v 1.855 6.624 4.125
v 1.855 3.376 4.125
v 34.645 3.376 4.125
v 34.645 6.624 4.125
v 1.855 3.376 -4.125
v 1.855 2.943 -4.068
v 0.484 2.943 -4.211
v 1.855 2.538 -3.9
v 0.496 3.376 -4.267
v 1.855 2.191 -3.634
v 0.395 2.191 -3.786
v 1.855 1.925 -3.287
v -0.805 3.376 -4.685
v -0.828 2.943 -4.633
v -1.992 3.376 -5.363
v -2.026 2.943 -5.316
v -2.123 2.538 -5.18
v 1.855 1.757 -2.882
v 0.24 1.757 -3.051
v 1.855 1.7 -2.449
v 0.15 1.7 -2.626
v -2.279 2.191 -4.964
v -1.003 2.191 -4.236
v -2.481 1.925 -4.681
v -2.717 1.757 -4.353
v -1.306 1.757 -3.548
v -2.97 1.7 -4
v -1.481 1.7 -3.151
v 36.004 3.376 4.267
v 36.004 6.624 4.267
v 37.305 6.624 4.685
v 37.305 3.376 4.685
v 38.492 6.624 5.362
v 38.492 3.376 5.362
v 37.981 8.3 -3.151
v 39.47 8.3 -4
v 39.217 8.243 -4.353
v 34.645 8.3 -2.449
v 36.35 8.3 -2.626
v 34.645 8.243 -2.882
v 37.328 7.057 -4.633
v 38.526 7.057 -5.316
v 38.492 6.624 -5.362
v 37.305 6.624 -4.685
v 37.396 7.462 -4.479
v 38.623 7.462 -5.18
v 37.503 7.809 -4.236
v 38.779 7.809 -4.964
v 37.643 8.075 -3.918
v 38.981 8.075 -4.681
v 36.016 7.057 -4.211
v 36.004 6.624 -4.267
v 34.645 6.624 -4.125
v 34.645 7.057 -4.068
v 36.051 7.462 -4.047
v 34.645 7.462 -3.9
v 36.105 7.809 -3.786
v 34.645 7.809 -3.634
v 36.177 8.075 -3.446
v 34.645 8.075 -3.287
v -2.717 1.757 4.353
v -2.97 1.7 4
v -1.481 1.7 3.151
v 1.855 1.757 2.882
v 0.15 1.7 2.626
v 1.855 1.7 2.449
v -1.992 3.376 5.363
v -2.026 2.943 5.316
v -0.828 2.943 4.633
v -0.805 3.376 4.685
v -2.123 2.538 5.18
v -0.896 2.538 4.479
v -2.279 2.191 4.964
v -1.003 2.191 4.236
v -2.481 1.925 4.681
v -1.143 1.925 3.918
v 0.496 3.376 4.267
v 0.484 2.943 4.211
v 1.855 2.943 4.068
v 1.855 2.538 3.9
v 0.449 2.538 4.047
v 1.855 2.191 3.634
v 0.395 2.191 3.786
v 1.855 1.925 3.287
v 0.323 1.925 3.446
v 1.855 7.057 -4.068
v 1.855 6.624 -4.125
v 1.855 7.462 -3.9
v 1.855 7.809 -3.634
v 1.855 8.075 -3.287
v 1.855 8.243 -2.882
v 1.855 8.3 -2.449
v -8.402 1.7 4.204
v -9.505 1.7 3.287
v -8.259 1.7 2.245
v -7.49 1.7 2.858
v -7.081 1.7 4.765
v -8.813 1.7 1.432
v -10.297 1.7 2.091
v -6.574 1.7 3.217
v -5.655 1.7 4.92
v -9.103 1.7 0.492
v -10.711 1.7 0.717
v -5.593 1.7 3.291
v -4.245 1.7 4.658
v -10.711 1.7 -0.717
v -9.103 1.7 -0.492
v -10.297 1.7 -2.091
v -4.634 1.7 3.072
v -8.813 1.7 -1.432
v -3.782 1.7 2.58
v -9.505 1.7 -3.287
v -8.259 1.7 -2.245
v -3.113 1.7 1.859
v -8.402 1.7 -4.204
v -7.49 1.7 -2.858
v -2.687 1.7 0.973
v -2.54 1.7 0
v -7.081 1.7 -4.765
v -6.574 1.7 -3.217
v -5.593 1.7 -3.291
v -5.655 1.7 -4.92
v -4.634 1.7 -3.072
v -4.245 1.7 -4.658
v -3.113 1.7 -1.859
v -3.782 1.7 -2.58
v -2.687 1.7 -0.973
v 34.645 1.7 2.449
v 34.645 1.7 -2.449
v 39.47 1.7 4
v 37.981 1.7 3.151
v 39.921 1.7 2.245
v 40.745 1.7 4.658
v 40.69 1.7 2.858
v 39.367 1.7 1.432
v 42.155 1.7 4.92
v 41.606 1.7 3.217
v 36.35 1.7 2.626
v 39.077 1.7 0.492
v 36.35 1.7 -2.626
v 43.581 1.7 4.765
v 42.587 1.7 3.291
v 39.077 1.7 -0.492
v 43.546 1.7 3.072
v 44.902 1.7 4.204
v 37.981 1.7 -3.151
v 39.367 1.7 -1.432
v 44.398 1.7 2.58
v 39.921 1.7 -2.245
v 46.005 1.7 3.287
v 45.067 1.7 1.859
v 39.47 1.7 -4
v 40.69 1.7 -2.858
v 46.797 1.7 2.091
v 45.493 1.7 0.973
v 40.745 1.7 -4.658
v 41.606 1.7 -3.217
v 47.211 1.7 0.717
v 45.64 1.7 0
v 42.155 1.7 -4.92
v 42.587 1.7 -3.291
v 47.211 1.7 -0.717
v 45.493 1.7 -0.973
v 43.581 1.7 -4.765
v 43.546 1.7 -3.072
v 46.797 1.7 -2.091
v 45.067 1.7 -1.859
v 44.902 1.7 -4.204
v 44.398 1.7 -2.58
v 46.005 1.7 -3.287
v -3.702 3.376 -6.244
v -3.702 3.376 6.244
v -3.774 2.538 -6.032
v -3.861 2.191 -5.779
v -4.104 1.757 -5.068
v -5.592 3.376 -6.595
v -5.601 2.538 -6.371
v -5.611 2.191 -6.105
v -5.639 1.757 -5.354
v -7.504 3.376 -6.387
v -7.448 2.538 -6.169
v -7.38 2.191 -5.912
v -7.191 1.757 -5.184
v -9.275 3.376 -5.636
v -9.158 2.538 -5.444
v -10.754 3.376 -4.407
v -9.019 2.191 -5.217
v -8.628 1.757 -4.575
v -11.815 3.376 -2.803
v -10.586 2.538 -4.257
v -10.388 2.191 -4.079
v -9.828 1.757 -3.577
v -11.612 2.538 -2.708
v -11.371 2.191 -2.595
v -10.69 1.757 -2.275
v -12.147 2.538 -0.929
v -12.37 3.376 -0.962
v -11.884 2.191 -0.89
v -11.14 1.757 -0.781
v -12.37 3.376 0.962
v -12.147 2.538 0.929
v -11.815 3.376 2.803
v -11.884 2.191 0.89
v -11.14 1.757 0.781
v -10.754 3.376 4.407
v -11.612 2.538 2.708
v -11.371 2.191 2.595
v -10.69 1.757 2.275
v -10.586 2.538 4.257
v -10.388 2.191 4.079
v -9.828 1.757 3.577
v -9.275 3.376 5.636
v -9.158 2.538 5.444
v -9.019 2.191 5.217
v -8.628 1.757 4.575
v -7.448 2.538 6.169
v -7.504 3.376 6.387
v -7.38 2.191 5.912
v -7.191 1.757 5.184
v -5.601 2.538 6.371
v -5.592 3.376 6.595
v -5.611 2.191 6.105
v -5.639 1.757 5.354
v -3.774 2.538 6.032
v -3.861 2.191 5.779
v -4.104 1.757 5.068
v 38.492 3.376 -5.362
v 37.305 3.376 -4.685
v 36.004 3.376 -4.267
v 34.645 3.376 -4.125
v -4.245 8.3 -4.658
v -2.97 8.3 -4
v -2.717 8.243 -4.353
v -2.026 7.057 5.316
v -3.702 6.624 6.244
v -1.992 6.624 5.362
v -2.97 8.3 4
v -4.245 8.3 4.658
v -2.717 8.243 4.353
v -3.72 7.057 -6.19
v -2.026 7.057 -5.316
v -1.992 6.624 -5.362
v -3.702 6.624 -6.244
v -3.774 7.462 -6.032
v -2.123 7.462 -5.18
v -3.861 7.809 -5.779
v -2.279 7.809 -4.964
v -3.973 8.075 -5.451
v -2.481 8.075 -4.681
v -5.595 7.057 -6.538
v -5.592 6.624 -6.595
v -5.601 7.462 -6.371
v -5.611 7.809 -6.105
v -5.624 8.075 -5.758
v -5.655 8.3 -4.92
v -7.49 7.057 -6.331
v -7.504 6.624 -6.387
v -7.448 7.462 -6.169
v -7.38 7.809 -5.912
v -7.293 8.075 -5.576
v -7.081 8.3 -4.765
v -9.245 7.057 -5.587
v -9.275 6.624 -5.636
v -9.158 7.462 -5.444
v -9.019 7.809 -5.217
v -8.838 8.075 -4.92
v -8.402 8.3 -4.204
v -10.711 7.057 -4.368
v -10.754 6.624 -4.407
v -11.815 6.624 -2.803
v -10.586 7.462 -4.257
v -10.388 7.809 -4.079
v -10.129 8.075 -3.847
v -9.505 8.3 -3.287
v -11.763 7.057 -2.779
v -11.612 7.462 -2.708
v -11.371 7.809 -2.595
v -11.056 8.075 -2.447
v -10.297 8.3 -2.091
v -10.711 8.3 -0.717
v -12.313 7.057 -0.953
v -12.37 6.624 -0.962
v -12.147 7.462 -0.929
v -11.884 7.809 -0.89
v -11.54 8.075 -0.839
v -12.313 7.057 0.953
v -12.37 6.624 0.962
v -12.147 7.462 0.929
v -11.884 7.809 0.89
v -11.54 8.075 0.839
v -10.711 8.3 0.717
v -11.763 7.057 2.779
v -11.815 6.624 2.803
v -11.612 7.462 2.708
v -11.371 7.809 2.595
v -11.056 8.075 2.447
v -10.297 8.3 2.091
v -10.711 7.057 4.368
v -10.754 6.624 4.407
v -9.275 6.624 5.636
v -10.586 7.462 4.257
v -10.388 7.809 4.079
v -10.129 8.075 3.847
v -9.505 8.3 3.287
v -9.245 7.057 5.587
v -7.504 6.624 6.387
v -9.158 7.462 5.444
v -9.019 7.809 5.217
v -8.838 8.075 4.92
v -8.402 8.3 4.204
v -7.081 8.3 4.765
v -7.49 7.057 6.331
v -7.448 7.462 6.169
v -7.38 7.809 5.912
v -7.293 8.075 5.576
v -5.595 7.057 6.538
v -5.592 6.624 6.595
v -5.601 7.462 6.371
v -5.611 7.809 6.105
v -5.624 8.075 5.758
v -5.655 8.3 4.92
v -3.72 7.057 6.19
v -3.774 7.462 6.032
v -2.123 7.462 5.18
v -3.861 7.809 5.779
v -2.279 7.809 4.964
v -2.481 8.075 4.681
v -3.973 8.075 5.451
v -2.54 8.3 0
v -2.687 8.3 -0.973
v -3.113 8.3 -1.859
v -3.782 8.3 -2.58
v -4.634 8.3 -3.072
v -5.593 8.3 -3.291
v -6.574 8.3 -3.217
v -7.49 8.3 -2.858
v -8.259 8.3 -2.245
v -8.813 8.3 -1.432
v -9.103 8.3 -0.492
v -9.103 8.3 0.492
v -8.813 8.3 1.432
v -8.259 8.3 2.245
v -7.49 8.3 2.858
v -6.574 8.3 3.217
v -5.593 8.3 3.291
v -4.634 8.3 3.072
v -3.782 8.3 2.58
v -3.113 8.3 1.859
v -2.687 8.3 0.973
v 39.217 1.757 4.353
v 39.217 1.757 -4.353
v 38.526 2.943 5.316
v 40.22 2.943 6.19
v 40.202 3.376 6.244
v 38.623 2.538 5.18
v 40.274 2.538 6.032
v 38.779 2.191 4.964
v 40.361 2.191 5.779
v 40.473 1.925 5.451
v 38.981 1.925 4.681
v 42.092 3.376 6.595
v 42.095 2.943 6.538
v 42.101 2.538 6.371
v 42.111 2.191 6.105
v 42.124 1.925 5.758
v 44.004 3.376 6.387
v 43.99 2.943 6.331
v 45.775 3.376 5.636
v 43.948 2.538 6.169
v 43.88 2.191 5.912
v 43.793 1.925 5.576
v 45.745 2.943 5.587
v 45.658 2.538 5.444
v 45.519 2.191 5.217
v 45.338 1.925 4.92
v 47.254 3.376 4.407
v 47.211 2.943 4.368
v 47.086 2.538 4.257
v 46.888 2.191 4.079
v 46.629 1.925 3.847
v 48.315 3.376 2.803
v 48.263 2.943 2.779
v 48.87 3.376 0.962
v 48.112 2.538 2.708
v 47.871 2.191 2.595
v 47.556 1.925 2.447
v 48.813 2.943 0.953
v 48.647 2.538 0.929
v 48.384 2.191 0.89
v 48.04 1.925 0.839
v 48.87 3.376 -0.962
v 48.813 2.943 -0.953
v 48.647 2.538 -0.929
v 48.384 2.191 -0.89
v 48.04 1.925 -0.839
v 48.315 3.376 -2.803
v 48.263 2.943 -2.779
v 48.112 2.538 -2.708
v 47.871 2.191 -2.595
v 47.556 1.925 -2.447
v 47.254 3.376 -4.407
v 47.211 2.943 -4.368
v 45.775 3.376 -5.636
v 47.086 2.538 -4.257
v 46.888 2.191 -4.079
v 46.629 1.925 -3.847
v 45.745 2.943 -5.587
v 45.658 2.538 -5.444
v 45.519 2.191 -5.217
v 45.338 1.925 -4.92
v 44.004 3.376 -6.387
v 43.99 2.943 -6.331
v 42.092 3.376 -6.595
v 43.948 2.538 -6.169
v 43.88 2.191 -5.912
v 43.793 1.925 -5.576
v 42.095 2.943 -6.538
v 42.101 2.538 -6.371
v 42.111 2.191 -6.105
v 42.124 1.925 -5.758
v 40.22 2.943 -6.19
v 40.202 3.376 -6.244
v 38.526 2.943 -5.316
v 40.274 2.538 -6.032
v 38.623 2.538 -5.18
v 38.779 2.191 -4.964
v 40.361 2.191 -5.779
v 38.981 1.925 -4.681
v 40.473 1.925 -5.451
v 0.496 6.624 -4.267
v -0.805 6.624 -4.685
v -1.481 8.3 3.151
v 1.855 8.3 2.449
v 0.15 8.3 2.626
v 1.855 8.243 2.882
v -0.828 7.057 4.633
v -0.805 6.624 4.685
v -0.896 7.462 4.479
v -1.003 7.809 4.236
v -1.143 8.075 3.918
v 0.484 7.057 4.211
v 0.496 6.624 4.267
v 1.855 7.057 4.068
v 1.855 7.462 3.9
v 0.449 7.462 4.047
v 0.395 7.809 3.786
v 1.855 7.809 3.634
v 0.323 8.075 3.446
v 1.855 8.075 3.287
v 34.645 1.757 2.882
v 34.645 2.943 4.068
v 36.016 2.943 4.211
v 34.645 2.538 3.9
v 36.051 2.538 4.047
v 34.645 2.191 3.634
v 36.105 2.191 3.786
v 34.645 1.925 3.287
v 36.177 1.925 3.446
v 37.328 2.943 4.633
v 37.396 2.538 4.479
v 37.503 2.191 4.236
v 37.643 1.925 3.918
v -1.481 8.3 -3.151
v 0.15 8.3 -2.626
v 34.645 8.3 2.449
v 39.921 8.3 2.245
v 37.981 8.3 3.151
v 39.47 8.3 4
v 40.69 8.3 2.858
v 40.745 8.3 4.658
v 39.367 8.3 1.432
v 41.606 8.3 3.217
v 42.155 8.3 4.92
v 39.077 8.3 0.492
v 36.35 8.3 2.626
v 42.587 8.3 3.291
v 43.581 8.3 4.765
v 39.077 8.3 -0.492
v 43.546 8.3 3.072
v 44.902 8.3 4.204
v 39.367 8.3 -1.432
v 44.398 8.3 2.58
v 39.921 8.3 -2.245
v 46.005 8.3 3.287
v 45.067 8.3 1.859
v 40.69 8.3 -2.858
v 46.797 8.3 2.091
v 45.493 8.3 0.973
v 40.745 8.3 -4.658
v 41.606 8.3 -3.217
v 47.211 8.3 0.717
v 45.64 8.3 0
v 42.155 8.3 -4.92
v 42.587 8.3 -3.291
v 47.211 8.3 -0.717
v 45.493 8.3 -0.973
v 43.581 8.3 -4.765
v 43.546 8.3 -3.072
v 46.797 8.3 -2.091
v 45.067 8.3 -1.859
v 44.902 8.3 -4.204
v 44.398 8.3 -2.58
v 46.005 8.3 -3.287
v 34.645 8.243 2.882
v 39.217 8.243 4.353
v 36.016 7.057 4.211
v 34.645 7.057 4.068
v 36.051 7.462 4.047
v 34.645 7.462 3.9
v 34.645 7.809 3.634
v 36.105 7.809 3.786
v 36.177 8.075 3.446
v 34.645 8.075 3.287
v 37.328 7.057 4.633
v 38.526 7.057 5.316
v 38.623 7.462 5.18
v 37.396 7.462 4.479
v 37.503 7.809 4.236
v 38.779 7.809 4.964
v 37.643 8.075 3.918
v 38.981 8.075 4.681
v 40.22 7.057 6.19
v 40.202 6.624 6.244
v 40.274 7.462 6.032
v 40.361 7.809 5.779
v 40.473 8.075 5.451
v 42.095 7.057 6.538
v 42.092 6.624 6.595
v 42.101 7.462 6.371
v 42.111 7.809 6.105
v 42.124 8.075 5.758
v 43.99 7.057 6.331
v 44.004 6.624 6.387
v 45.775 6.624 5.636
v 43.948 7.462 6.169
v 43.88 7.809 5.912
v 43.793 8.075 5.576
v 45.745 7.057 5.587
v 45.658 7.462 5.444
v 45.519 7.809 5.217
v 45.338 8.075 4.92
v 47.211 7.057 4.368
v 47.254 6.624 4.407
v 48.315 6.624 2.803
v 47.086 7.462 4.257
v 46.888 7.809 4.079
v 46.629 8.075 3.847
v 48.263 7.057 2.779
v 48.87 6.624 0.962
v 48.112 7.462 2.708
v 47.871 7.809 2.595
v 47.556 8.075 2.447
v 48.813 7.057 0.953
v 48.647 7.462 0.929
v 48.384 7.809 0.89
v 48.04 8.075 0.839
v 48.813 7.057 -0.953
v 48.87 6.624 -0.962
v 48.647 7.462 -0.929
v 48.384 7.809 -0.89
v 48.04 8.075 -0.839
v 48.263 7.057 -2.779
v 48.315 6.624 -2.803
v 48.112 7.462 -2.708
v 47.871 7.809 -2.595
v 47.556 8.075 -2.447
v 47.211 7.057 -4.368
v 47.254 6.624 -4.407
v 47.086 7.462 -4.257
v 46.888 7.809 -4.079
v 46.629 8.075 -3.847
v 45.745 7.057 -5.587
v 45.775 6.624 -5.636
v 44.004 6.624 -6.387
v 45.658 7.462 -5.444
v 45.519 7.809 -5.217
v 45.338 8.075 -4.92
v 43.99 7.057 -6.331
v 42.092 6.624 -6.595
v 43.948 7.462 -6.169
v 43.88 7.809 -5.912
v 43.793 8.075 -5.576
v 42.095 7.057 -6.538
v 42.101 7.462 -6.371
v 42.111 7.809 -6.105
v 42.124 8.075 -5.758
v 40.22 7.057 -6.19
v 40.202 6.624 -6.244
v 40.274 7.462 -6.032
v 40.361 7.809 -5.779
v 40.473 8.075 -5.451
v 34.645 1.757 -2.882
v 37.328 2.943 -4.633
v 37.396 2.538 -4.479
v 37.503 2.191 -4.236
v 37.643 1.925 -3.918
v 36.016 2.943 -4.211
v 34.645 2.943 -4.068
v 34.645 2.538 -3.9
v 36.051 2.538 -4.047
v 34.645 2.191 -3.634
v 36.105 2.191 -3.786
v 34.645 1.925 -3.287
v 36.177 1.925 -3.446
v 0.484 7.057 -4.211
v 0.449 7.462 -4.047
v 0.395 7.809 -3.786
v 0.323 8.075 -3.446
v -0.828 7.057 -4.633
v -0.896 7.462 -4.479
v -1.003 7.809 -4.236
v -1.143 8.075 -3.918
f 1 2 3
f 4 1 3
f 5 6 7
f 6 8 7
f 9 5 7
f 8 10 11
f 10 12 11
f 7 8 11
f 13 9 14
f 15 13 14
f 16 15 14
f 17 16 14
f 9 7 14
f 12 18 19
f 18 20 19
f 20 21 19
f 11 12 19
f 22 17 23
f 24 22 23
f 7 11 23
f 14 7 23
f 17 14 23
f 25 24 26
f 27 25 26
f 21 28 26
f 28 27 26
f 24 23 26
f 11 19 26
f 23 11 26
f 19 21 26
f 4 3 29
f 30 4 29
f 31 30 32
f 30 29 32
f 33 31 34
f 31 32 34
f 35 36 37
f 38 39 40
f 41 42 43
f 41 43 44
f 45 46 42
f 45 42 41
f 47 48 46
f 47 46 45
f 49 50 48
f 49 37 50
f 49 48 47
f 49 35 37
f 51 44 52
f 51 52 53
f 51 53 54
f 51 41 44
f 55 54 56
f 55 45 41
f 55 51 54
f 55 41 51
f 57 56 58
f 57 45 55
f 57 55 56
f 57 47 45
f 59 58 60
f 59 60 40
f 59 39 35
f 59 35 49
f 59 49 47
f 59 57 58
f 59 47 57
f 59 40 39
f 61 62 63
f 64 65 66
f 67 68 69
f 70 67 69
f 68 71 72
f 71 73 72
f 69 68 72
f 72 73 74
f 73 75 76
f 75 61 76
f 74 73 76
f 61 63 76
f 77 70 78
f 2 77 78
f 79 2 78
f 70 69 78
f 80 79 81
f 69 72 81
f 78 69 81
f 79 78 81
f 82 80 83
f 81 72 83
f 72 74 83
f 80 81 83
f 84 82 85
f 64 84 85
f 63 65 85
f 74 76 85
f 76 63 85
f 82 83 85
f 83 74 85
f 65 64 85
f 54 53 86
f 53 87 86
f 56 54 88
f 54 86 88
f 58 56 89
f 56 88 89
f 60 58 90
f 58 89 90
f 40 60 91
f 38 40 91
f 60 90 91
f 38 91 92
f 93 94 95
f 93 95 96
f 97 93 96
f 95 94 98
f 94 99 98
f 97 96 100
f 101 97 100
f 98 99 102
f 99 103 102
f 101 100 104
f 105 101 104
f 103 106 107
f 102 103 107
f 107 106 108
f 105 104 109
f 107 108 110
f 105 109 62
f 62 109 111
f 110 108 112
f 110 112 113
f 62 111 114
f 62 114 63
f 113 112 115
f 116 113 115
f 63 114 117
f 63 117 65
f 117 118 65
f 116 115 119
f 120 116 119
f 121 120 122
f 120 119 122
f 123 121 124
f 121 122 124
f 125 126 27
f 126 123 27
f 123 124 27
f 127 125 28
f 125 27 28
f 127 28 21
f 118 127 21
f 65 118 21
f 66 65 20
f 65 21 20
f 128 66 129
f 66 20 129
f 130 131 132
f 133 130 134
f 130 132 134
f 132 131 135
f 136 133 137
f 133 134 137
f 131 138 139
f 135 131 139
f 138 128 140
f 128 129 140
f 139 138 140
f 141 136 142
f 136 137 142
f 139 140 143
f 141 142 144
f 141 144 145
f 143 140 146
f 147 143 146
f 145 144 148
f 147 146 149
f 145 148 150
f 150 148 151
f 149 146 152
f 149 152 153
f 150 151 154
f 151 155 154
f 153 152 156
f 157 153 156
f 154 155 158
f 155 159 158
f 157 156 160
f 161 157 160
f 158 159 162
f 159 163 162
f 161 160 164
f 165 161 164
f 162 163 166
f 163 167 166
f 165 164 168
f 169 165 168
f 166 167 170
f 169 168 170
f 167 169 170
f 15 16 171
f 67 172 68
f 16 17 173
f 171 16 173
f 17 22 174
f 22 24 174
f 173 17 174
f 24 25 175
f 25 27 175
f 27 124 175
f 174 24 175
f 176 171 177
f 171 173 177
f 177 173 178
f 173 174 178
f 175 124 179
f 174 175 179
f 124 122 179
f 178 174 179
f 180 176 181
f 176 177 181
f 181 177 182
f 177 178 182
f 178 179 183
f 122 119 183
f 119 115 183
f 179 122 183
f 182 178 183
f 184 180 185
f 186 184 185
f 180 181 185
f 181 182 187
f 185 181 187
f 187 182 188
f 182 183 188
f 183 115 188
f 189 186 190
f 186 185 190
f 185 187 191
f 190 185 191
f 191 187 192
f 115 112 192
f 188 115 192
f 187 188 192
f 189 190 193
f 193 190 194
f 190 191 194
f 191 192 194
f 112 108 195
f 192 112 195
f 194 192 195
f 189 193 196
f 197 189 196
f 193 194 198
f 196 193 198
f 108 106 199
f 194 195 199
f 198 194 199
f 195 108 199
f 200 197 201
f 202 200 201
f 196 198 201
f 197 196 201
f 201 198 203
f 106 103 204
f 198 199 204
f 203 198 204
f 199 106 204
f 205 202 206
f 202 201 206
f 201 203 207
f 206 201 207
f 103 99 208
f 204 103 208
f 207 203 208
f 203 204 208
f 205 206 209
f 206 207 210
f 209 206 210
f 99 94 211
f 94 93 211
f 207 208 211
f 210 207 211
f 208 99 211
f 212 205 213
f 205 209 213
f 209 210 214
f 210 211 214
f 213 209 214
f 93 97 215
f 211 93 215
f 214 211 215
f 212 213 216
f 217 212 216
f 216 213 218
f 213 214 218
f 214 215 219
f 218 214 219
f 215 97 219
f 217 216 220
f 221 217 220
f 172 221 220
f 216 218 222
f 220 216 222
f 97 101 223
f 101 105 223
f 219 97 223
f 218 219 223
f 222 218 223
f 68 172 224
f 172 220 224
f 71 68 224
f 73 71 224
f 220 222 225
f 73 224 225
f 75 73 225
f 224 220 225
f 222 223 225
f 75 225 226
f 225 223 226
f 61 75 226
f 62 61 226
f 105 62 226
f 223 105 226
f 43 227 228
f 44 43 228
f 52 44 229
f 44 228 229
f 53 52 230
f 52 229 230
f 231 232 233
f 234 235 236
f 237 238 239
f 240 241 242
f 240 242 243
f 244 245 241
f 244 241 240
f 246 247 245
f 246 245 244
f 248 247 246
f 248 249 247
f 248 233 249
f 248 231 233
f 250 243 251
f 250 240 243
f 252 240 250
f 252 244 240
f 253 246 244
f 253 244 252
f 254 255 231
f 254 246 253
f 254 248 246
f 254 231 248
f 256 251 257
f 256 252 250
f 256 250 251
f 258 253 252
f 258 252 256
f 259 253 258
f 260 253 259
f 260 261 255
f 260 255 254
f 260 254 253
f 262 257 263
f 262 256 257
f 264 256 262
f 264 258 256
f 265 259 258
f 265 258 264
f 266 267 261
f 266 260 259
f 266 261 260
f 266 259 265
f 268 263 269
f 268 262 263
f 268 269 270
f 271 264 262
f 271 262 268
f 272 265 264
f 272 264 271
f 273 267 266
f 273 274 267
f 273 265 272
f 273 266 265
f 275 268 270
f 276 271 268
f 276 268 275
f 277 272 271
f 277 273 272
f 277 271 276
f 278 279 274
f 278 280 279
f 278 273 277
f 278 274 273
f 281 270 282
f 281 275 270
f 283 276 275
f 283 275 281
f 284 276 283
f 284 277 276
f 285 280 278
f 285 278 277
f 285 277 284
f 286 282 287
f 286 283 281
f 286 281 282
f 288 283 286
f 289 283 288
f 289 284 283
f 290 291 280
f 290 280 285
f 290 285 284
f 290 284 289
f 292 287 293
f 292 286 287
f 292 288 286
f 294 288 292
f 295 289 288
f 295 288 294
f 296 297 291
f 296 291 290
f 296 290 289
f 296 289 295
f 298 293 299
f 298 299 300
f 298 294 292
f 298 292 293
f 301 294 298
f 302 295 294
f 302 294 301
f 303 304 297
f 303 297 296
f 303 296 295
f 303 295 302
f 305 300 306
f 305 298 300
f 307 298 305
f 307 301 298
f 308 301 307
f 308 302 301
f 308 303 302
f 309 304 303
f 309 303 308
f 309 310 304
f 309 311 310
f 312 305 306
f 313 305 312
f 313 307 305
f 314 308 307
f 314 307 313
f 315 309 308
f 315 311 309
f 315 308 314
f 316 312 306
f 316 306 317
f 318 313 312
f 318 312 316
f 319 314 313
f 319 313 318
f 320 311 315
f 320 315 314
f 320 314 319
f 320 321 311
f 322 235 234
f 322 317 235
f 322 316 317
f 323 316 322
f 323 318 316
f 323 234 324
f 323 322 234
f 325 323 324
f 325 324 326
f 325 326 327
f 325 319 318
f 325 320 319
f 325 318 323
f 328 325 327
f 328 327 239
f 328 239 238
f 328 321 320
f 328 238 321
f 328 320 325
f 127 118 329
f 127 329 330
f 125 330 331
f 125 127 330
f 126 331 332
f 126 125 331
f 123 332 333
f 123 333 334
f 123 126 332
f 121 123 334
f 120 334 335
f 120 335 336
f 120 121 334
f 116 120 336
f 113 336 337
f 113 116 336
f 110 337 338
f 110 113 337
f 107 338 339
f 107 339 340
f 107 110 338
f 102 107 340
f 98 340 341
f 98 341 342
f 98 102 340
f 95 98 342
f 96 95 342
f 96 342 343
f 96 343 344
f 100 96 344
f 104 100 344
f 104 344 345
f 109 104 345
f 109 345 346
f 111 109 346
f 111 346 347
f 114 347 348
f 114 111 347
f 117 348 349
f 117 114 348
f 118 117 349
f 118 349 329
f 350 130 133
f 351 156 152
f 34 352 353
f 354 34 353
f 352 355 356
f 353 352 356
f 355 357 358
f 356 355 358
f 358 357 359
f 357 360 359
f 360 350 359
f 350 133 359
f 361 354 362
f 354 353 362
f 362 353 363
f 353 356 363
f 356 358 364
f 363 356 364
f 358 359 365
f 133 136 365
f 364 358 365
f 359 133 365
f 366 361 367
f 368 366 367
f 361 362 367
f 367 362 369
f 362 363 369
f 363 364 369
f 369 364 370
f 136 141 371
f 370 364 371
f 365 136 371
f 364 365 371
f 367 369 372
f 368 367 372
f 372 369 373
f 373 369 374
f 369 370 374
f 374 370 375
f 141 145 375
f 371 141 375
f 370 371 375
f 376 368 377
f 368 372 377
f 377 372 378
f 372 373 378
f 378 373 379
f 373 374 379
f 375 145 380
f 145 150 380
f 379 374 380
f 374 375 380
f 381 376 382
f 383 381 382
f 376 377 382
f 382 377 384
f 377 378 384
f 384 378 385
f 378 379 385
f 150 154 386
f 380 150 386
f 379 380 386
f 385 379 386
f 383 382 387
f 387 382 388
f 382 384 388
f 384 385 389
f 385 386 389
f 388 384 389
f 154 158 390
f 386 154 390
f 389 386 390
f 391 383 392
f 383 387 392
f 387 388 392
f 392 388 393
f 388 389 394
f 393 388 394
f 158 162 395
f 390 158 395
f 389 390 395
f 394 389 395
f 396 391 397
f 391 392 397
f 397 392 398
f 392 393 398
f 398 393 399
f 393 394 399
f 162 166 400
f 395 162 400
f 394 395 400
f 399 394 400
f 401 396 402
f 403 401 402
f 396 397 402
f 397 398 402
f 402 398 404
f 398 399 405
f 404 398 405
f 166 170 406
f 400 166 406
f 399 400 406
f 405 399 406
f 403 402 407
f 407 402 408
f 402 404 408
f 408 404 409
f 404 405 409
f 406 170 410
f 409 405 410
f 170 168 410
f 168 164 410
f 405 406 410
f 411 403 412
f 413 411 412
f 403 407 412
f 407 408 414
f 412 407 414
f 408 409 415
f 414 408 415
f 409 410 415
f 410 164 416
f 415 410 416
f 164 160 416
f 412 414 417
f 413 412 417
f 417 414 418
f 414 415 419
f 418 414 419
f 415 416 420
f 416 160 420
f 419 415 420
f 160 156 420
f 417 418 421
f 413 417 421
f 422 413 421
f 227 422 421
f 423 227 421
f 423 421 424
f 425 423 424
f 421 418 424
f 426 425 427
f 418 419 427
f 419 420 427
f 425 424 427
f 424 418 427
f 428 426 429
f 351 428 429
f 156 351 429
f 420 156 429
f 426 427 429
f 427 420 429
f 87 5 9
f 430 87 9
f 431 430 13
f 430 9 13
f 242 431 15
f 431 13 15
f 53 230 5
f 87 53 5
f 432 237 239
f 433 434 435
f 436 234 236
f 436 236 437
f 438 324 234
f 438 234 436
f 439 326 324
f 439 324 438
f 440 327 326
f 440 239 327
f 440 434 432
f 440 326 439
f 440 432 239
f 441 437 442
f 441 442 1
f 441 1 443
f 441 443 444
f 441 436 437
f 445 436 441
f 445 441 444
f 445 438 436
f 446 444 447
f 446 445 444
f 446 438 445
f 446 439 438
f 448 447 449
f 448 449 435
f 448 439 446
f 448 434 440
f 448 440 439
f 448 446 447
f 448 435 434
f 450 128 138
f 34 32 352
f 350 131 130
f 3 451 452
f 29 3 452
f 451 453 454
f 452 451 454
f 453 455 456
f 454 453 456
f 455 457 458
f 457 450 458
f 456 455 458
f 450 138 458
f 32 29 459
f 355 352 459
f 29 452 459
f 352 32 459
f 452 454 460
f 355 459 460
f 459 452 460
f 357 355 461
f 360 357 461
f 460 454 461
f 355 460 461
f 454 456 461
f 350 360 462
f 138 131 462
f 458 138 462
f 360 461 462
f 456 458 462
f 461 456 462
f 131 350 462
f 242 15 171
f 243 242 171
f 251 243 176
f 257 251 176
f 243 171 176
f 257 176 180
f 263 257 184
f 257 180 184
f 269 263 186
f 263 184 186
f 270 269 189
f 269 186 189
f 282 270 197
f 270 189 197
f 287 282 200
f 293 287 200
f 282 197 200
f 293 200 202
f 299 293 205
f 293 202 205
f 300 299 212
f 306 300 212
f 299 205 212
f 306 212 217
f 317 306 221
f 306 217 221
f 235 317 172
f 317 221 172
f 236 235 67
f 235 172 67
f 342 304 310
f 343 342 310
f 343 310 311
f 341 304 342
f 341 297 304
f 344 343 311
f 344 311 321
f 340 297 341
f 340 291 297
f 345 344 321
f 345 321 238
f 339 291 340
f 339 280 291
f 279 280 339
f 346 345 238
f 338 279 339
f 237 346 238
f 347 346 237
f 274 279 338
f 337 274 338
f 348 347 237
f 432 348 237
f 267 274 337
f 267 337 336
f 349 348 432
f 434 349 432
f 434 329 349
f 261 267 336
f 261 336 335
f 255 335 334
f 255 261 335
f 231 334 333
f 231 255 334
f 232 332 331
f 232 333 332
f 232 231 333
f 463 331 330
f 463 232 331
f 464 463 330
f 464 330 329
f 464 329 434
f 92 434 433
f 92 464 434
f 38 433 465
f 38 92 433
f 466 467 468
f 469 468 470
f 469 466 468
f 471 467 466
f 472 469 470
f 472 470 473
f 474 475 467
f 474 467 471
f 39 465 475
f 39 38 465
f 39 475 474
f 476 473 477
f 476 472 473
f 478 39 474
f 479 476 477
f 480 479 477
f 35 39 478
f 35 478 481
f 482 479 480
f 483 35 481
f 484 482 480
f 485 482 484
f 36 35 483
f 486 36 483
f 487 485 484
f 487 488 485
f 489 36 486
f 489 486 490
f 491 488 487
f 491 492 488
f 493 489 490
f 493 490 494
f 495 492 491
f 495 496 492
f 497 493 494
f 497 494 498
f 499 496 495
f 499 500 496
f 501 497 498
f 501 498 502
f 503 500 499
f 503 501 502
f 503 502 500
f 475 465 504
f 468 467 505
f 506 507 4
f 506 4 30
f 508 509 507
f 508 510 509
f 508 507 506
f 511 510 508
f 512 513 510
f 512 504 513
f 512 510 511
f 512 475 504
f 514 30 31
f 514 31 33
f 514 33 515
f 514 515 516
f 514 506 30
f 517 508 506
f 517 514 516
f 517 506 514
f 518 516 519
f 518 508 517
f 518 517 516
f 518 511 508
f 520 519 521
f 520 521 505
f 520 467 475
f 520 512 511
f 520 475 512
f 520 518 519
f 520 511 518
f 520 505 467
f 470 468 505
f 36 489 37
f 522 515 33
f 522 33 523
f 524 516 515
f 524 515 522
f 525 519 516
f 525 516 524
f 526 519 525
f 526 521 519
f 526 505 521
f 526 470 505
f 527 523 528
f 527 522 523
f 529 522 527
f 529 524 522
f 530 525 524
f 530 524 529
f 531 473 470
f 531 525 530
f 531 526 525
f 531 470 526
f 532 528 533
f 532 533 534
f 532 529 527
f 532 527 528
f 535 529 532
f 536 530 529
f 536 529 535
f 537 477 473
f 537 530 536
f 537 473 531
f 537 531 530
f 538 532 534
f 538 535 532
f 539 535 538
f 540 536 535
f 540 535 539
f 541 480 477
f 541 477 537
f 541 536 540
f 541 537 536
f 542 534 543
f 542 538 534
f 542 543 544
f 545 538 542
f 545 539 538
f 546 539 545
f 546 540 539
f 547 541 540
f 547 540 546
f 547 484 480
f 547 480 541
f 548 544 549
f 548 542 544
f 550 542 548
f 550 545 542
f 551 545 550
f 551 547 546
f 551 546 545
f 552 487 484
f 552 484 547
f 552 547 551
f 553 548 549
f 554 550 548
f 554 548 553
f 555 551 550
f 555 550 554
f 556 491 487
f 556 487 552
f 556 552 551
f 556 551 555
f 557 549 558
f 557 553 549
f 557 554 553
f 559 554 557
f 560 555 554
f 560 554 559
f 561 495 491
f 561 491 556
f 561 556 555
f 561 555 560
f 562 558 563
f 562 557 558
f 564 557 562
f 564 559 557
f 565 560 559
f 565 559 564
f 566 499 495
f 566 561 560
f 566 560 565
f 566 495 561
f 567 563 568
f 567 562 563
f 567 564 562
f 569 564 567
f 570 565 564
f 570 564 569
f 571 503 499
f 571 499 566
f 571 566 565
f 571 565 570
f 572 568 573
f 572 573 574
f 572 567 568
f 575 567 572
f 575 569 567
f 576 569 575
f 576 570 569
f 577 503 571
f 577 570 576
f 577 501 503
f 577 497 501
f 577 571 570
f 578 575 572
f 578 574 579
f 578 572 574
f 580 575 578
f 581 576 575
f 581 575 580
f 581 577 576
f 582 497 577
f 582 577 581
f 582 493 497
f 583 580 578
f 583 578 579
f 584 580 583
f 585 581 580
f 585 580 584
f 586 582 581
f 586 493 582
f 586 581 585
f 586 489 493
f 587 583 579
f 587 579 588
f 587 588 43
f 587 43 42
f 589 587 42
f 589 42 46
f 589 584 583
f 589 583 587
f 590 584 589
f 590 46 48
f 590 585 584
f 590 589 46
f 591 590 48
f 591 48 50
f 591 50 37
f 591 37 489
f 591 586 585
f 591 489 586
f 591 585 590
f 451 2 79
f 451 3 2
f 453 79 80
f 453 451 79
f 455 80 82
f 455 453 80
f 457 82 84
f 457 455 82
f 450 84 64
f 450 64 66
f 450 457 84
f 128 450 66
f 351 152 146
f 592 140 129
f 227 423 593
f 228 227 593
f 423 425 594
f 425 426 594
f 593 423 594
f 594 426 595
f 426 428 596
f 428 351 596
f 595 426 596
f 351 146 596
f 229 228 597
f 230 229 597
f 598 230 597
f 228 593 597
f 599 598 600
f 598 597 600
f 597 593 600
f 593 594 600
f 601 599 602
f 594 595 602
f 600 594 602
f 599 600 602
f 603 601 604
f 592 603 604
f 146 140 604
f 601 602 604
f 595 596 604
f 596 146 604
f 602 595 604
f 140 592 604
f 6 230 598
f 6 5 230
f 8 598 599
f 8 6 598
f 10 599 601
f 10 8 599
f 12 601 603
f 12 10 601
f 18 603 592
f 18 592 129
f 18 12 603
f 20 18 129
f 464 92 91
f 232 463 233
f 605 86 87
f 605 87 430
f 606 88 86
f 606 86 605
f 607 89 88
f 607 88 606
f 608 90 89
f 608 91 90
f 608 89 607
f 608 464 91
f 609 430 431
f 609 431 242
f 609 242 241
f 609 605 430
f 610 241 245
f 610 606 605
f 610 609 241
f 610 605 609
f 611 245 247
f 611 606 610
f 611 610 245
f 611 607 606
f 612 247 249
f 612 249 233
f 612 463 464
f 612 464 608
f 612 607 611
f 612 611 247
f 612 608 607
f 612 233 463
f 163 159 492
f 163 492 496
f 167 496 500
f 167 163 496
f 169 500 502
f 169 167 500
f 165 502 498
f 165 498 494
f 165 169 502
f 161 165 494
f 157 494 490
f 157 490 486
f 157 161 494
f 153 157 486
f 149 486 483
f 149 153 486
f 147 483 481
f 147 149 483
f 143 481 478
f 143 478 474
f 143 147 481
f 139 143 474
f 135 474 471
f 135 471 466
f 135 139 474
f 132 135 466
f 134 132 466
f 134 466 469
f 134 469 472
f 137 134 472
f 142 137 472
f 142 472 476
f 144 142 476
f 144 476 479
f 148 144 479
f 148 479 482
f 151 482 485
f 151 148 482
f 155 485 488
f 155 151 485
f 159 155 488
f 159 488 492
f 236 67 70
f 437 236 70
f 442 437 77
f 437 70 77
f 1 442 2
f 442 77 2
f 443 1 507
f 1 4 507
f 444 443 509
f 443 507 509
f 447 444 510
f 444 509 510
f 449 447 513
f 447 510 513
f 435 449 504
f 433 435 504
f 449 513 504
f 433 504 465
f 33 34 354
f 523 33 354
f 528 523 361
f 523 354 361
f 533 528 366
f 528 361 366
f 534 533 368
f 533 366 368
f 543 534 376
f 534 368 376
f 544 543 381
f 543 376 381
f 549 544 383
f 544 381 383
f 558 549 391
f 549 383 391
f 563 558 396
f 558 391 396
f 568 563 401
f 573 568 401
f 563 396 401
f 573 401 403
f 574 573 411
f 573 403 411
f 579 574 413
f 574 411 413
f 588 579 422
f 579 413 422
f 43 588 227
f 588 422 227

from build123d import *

# Parameters (mm, degrees)
SKETCH1_R           = 5
BOSS_EXTRUDE1_DEPTH = 10
FILLET1_R           = 2.54
SCALE1_SCALE        = 0.66


with BuildPart() as part:
    # Sketch1 → Boss-Extrude1 (new body)
    with BuildSketch(Plane(origin=(0, 0, 0), x_dir=(1, 0, 0), z_dir=(0, 1, 0))):
        with BuildLine():
            Line((-6.590776184, -6.25), (43.090776184, -6.25))
            ThreePointArc((43.090776184, -6.25), (46.152638362, -6.730283618), (48.920388092, -8.125))
            ThreePointArc((48.920388092, -8.125), (64.75, 0), (48.920388092, 8.125))
            ThreePointArc((48.920388092, 8.125), (46.152638362, 6.730283618), (43.090776184, 6.25))
            Line((43.090776184, 6.25), (-6.590776184, 6.25))
            ThreePointArc((-6.590776184, 6.25), (-9.652638362, 6.730283618), (-12.420388092, 8.125))
            ThreePointArc((-12.420388092, 8.125), (-28.25, 0), (-12.420388092, -8.125))
            ThreePointArc((-12.420388092, -8.125), (-9.652638362, -6.730283618), (-6.590776184, -6.25))
        make_face()
        with Locations((-18.25, 0)):
            Circle(SKETCH1_R, mode=Mode.SUBTRACT)
        with Locations((54.75, 0)):
            Circle(SKETCH1_R, mode=Mode.SUBTRACT)
    extrude(amount=BOSS_EXTRUDE1_DEPTH)

    # Fillet1
    fillet1_edges = [part.edges().sort_by_distance(p)[0] for p in [
        (-9.652638362, 10, 6.730283618),
        (-28.25, 0, 0),
        (-9.652638362, 0, -6.730283618),
        (18.25, 10, 6.25),
        (46.152638362, 10, 6.730283618),
        (64.75, 10, 0),
        (46.152638362, 10, -6.730283618),
        (18.25, 10, -6.25),
        (-9.652638362, 10, -6.730283618),
        (-28.25, 10, 0),
        (18.25, 0, -6.25),
        (46.152638362, 0, -6.730283618),
        (64.75, 0, 0),
        (46.152638362, 0, 6.730283618),
        (18.25, 0, 6.25),
        (-9.652638362, 0, 6.730283618),
    ]]
    fillet(fillet1_edges, radius=FILLET1_R)


with BuildPart() as part_1:
    # Scale1: scaled about (18.25, 5, 0)
    add(part.part.scale(SCALE1_SCALE).moved(Location((6.205, 1.7, 0))))


solid = part_1.part
